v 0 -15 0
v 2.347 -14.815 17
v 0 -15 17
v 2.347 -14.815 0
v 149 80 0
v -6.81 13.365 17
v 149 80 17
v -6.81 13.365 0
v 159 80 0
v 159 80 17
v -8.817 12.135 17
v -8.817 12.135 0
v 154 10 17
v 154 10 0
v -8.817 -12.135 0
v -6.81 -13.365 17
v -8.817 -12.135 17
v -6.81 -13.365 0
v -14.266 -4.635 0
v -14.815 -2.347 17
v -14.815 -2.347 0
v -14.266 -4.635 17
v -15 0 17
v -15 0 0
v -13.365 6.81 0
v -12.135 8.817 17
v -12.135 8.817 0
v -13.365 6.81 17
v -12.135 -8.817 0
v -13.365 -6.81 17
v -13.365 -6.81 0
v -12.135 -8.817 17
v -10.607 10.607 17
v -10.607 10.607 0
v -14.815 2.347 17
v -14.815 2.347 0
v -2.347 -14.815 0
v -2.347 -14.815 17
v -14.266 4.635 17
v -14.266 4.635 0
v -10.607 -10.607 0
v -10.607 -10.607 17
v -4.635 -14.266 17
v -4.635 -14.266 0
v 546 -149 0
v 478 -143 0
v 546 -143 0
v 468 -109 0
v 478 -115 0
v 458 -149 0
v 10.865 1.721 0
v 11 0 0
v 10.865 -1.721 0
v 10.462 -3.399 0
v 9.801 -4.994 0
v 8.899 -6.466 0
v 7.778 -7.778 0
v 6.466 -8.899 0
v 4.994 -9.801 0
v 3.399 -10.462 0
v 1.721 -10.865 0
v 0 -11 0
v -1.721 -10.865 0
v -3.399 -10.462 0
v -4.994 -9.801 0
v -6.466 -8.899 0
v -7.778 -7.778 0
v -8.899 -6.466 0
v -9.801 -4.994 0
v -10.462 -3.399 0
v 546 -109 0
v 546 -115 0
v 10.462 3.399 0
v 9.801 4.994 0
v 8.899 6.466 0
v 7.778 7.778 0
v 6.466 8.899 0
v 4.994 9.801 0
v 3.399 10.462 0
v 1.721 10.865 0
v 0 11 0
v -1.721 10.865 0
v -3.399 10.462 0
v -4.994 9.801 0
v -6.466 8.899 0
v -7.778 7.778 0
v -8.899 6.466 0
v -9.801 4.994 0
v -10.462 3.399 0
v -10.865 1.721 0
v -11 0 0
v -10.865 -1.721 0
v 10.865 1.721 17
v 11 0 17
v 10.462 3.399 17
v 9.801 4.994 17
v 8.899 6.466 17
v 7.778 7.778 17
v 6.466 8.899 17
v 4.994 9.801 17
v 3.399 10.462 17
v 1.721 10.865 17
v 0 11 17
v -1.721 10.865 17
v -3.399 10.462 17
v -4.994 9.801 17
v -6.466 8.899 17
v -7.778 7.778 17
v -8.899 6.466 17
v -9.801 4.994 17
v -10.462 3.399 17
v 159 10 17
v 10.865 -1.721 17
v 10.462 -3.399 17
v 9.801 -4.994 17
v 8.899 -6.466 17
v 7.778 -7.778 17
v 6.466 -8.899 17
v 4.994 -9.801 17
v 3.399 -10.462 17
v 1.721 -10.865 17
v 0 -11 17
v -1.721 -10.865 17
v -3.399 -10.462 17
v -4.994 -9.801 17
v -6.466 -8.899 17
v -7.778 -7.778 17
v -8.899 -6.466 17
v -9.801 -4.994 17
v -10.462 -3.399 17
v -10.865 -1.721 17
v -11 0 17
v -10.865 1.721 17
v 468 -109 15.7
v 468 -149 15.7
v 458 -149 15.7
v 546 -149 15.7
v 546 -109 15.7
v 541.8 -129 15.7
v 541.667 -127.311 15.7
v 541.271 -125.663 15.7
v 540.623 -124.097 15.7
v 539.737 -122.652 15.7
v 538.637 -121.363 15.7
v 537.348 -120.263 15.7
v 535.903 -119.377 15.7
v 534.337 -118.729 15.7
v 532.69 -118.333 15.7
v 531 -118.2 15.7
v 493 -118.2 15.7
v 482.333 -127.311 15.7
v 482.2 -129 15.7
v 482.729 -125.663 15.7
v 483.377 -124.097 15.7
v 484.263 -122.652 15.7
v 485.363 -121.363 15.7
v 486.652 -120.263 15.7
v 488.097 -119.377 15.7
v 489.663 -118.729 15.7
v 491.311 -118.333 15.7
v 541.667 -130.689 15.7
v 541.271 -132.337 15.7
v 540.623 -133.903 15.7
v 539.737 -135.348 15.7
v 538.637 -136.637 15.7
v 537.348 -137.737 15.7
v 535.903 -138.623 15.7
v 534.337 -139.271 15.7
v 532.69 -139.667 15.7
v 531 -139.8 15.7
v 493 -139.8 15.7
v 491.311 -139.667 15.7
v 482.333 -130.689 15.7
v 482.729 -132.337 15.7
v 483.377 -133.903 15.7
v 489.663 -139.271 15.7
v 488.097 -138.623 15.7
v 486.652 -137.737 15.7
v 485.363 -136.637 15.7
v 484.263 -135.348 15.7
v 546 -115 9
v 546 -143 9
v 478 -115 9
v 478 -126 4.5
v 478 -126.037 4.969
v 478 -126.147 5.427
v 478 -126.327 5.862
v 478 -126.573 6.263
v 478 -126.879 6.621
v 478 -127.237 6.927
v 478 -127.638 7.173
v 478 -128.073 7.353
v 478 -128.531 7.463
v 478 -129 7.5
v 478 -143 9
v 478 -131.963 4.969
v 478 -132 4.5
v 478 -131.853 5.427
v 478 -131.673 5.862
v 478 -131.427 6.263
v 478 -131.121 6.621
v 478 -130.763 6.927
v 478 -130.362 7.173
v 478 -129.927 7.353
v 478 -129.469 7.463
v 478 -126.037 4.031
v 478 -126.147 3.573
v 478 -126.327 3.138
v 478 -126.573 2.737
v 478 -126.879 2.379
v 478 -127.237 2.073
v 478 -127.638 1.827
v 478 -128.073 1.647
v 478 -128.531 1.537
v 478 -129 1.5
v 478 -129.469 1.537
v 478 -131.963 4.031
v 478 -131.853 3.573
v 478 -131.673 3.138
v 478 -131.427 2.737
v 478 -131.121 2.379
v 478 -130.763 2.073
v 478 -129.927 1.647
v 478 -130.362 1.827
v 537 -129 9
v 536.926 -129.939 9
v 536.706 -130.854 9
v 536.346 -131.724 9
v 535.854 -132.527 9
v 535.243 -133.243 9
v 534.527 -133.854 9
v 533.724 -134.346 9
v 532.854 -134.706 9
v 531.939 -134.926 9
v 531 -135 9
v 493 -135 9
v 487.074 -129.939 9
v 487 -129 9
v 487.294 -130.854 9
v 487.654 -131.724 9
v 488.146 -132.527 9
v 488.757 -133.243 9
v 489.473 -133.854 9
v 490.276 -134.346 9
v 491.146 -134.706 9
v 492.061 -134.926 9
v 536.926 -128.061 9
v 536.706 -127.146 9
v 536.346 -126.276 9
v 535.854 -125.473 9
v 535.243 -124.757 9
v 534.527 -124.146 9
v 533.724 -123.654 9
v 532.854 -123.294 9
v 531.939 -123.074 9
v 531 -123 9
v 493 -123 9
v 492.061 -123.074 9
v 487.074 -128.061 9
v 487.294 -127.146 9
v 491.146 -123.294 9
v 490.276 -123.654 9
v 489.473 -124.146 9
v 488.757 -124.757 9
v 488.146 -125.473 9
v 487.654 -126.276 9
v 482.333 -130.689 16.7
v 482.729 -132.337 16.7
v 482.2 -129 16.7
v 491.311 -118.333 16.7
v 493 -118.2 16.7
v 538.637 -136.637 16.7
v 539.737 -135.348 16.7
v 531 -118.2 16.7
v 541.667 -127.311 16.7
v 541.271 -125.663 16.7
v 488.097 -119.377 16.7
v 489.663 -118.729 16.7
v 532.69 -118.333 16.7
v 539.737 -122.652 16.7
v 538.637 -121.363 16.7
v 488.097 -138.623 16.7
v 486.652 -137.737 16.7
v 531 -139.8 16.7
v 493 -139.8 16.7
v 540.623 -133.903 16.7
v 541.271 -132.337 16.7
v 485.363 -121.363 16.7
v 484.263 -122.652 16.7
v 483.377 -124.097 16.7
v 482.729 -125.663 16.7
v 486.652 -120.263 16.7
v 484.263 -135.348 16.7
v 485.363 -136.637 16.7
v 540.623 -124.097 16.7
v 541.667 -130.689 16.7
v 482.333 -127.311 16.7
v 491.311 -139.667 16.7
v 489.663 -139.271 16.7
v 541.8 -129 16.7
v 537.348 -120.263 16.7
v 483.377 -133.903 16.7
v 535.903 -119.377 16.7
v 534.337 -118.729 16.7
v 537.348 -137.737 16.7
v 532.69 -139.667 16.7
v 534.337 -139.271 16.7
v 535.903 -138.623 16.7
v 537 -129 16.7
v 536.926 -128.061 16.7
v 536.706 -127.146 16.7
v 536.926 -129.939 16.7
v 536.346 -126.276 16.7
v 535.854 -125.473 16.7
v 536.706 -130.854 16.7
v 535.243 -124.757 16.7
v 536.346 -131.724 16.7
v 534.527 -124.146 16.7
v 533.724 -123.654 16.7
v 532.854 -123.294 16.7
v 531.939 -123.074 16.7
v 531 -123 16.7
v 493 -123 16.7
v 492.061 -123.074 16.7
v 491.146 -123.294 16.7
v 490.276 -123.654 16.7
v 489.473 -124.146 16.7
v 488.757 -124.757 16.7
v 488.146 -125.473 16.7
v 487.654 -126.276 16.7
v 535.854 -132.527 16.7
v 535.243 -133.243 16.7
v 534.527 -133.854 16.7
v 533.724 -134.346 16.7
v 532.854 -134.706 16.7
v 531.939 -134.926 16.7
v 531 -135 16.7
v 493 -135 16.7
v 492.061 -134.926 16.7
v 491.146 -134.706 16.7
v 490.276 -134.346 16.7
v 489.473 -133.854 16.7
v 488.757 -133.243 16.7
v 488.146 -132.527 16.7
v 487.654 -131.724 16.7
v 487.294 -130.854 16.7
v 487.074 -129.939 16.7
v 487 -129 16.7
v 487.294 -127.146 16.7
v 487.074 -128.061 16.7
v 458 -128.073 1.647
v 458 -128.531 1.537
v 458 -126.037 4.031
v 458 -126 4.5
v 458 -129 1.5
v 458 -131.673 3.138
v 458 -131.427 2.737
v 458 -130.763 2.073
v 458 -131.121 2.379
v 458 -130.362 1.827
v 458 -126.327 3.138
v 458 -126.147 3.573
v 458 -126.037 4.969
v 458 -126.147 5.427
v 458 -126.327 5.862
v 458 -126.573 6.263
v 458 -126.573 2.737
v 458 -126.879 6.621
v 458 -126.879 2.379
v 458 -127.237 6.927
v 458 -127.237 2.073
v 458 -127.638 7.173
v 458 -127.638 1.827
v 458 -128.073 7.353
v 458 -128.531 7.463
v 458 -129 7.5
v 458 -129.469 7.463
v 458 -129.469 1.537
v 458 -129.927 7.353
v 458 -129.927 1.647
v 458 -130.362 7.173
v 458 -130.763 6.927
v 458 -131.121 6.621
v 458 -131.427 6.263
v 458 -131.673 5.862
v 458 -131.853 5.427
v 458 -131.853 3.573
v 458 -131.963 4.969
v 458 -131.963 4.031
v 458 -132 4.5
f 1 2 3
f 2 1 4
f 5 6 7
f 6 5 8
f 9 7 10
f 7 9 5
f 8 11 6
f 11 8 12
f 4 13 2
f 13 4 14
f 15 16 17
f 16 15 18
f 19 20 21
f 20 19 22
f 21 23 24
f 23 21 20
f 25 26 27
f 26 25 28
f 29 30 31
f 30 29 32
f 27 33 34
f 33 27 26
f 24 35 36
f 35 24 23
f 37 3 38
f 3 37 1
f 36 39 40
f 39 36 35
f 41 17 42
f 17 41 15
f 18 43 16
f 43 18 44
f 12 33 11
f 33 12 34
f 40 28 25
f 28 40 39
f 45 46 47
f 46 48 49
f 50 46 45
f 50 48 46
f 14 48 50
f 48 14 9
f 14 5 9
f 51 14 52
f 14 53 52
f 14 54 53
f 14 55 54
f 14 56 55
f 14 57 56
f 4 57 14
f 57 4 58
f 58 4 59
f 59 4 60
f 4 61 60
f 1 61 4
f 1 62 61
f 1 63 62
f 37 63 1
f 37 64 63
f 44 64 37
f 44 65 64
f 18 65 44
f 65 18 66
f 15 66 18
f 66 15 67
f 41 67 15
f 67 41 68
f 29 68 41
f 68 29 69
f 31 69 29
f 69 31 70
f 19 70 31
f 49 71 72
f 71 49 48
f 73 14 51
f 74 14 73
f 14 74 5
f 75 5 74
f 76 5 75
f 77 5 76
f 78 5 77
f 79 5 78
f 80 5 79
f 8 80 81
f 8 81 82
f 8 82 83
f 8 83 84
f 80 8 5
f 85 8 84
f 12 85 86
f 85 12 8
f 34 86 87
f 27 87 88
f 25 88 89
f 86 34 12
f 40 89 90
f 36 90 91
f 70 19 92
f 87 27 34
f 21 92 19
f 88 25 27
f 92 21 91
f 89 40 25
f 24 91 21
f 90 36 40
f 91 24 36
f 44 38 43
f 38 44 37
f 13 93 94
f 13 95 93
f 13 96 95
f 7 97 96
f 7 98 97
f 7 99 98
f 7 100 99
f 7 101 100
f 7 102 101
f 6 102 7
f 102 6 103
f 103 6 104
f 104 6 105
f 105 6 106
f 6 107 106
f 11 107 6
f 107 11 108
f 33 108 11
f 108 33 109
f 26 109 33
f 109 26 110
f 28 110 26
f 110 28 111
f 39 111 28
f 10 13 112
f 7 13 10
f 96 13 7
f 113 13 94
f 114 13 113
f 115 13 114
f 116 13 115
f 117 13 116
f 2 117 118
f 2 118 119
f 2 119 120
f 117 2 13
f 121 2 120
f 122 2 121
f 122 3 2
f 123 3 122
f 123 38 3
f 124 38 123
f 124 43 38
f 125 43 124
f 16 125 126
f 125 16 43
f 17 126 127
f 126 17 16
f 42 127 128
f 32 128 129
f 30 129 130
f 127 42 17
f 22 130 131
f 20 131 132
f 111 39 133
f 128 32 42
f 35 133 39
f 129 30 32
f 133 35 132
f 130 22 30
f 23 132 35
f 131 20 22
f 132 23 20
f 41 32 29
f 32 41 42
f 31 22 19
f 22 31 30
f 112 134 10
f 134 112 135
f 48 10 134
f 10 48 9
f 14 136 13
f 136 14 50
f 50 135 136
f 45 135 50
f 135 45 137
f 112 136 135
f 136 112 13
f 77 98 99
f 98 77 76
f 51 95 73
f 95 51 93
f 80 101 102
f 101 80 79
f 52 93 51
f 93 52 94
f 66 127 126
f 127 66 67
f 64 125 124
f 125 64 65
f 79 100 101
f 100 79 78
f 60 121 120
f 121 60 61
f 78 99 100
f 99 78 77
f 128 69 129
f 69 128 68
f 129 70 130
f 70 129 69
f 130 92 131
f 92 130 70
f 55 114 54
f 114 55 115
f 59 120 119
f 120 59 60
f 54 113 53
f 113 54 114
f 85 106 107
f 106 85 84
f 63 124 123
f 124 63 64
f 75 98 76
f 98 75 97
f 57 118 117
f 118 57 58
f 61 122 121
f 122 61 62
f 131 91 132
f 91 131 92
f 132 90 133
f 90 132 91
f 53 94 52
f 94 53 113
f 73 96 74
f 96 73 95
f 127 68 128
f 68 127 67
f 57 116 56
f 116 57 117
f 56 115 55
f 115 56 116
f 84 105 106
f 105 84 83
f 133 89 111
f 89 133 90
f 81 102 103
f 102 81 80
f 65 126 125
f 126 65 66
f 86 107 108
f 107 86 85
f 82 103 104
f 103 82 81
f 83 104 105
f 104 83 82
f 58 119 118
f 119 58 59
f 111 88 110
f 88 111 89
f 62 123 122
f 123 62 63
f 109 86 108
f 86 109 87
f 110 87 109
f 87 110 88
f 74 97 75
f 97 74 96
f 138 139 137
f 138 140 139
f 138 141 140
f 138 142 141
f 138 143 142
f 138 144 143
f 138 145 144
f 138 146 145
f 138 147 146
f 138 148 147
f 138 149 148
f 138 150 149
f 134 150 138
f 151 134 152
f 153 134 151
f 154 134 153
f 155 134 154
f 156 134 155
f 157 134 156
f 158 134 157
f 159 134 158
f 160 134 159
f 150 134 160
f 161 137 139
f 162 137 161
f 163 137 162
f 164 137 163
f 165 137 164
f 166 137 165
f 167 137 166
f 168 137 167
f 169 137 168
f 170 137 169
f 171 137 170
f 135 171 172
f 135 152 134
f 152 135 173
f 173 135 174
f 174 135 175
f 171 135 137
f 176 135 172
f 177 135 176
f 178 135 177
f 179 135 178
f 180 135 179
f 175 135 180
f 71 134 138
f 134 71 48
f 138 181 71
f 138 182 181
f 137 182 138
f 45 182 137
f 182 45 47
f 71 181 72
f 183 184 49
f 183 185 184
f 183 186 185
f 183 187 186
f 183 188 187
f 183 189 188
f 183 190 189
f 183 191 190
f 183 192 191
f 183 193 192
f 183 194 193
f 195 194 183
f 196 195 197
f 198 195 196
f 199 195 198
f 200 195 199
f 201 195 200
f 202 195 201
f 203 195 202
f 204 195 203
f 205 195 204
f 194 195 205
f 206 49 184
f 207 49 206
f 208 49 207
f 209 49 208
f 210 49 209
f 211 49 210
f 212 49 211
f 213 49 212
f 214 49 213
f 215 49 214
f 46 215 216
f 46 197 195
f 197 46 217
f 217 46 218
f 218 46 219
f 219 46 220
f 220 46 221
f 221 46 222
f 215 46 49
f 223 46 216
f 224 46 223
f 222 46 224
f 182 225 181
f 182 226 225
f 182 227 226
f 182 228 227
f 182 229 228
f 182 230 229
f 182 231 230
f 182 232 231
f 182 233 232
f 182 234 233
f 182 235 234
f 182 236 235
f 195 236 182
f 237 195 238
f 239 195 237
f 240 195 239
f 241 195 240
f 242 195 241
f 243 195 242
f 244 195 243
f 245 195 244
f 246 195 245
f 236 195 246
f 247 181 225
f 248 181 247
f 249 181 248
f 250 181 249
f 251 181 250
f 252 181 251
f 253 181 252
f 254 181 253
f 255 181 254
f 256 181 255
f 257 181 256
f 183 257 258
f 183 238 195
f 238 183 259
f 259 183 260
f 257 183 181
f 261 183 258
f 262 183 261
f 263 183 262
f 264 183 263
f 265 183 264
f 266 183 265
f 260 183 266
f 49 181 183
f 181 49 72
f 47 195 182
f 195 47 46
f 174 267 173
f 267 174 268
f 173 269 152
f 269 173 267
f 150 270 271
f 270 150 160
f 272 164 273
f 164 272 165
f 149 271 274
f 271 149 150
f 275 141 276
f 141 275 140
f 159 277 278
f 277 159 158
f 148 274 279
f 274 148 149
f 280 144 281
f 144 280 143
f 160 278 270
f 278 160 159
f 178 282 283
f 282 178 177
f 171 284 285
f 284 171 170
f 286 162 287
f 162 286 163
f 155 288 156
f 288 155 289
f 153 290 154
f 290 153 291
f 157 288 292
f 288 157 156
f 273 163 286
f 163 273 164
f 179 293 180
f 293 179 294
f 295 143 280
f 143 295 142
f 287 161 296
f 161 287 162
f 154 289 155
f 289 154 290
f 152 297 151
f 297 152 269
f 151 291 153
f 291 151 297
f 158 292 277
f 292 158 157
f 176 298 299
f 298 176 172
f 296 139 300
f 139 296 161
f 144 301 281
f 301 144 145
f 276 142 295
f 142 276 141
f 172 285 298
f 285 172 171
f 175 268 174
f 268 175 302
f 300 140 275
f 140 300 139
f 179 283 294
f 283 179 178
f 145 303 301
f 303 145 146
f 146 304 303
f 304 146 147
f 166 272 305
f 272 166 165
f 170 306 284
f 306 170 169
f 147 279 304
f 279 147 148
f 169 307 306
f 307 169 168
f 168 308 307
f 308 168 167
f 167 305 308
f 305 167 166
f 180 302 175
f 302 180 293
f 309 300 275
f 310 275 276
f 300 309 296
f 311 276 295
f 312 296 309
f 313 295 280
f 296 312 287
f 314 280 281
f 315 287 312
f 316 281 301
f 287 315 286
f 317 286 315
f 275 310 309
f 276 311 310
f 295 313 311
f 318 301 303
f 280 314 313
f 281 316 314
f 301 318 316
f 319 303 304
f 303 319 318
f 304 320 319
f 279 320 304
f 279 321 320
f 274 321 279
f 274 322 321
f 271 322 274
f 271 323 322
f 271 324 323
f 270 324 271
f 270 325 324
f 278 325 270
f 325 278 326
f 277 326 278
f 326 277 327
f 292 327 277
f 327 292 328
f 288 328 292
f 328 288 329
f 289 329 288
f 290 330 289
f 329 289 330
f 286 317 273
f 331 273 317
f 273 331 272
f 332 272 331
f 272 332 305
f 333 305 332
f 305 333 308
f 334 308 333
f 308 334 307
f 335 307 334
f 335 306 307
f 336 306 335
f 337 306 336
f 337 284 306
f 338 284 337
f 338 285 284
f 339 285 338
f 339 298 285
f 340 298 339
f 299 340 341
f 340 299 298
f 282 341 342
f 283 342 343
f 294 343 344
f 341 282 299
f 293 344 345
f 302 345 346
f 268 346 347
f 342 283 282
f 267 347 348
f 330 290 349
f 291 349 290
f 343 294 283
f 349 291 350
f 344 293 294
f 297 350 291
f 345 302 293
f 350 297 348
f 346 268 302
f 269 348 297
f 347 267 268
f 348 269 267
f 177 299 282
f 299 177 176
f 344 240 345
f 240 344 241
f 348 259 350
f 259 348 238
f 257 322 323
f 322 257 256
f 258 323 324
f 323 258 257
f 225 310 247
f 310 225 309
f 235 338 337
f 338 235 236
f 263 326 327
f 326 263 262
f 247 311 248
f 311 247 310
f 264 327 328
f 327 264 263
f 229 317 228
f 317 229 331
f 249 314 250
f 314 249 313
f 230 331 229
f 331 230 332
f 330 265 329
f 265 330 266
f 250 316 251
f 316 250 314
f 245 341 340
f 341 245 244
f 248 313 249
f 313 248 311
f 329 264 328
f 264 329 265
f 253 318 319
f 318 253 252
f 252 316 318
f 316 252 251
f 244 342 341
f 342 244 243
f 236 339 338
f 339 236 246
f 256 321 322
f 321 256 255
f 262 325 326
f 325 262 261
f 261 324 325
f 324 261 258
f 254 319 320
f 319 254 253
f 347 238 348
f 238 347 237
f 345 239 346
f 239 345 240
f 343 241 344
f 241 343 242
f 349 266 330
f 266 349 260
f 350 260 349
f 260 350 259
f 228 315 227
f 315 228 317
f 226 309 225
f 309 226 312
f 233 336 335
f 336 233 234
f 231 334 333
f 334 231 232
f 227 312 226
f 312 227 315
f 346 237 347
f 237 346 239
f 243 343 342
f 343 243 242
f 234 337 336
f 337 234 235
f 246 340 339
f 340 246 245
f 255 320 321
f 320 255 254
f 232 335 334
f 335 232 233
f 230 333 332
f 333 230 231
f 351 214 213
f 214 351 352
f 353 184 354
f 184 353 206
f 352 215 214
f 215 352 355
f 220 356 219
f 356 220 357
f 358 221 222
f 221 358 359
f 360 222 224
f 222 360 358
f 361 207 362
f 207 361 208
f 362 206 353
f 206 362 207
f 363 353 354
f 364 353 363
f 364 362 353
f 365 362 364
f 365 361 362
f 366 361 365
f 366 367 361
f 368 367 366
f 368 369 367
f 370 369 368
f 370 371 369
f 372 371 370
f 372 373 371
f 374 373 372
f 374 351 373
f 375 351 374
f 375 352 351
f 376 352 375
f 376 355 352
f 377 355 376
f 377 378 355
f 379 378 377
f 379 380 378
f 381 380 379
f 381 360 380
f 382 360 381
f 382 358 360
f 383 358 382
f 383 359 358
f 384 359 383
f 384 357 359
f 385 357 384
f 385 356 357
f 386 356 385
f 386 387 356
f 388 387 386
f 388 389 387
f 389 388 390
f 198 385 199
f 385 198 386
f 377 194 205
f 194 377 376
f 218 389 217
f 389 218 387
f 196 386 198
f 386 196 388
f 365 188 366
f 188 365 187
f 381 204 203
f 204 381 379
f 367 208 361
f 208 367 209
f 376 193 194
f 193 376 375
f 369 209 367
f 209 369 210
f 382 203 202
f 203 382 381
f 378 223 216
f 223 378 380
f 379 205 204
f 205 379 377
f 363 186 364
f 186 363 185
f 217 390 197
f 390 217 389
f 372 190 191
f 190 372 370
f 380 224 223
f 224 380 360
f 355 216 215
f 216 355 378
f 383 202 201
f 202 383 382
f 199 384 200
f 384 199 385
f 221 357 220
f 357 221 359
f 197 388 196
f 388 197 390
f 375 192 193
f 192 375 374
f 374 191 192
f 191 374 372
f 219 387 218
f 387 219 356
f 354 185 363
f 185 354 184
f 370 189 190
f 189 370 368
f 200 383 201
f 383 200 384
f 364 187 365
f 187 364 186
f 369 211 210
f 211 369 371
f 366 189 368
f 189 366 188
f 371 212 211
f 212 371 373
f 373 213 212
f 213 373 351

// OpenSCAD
// file: util/cylinder_channel.scad
module cylinder_channel(depth, diameter, length, x=0, y=0, z=0) {

    // Translate extruded shape on Z axis
    translate([0, 0, z]) {
        // Cutout
        linear_extrude(depth) {
            // Draw a hull around the two ends of the channel
            // to bore out the channel itself
            hull() {
                // Channel start - 'front'
                translate([x, y]) {
                    circle(d=diameter);
                }

                // Channel end - 'rear'
                translate([x + length, y]) {
                    circle(d=diameter);
                }
            }
        }
    }
}
// file: components/adjuster.scad
def_adj_bolt_diameter     = 6;  // M6x35 Adjuster Bolt
def_adj_bolt_length       = 35;

module SurRonAdjusterHole(
    length=def_adj_bolt_length,
    diameter=def_adj_bolt_diameter,
    height_offset,
    depth_offset,
    length_offset
) {
    // Adjuster bolt hole
    translate([length_offset, -height_offset, depth_offset]) {
    rotate([0, 90, 0]) {
        linear_extrude(length) {
                circle(d=diameter);
            }
        }
    }
}
// file: components/arm.scad
// Sur-Ron Rear Swingarm Arm (one side).
// Default dimensions measured from 2019 LBX (Off-Road) / drawings

def_pivot_diameter       = 22; // Bearing goes in here
def_pivot_outer_diameter = 30; // Guess, needs confirming for clearance
def_pivot_depth          = 17; // Measurement

// Guess, needs measuring later. This is the height between
// the midpoint of the pivot and the top of the midpoint 
// of the swingarm.
def_mid_offset_y         = 80;
def_mid_offset_x         = 149; // Guess, based on technical drawings
def_mid_height           = 70; // Guess
def_mid_depth            = 17; // Measurement, change based on req.
def_mid_length           = 10; // Guess, 1cm flat at 'midpoint'

def_rear_depth           = 15.7; // Must match dropout depth
def_rear_height          = 40; // Must match dropout height
def_rear_length          = 10;


// From technical drawings, this is the horizontal distance
// between the centre of the pivot point and the centre of
// the rear axle. We will need to adjust this based on the
// length of the dropout but for initial purposes, this will
// suffice.
def_length             = 458;

// From technical drawings, this is the drop between
// the center of the front pivot point and the rear axle.
// Since the rear axle is centered in the dropout, for 
// our purposes this is the drop between the centre 
// of the pivot point and the middle of the rear 'height'. 
def_drop               = 129; 


module SurRonArm(
    pivot_diameter=def_pivot_diameter,
    pivot_outer_diameter=def_pivot_outer_diameter,
    pivot_depth=def_pivot_depth,
    mid_height=def_mid_height,
    mid_offset_x=def_mid_offset_x,
    mid_offset_y=def_mid_offset_y,
    mid_depth=def_mid_depth,
    mid_length=def_mid_length,
    rear_depth=def_rear_depth,
    rear_height=def_rear_height,
    rear_length=def_rear_length,
    length=def_length,
    drop=def_drop,
){
    // Offset calculations
    mid_height_offset = mid_offset_y - mid_height;
    mid_rear_offset = mid_offset_x + (mid_length/2);

    rear_drop = - (drop+(rear_height/2));

    dropout_offset = length + rear_length;
    
    // End offset calculations

    difference() {
        union() {
            difference() {
                union() {
                    hull() {
                        // Pivot end swingarm outer
                        linear_extrude(pivot_depth) {
                            circle(d=pivot_outer_diameter);
                        }

                        // Midpoint - front
                        linear_extrude(mid_depth) {
                            translate([mid_offset_x, mid_height_offset]) {
                                square([mid_length/2, mid_height]);
                            }
                        }
                    }

                    hull() {
                        // Midpoint - rear
                        linear_extrude(mid_depth) {
                            translate([mid_rear_offset, mid_height_offset]) {
                                square([mid_length/2, mid_height]);
                            }
                        }

                        // Rear
                        linear_extrude(rear_depth) {
                            translate([length, rear_drop]) {
                                square([rear_length, rear_height]);
                            }
                        }
                    }
                }

                // Pivot end bearing hole
                linear_extrude(pivot_depth) {
                    circle(d=pivot_diameter);
                }
            }

            translate([dropout_offset, rear_drop]) {
                children(index=0);
            }
        }
        children(index=1);
    }
}
// file: components/dropout.scad
include <../util/cylinder_channel.scad>
// Sur-Ron Rear Axle Dropout for Swingarm.
// Default dimensions measured from 2019 LBX (Off-Road)
def_dropout_depth         = 15.7;
def_dropout_height        = 40;
def_dropout_length        = 78;

def_axle_channel_length   = 38;
def_axle_channel_diameter = 12; // M12 Rear Axle

def_adj_channel_depth     = 9;
def_adj_channel_length    = 68;
def_adj_channel_height    = 28;

def_adj_bolt_diameter     = 6;  // M6x35 Adjuster Bolt
def_adj_bolt_length       = 35;

def_pad_depth             = 1;
def_pad_diameter          = def_axle_channel_diameter * 1.8;


module SurRonDropOut(
    depth=def_dropout_depth,
    height=def_dropout_height,
    length=def_dropout_length,
    channel_length=def_axle_channel_length,
    channel_diameter=def_axle_channel_diameter,
    adj_depth=def_adj_channel_depth,
    adj_length=def_adj_channel_length,
    adj_height=def_adj_channel_height,
    adj_bolt_diameter=def_adj_bolt_diameter,
    adj_bolt_length=def_adj_bolt_length,
    pad_depth=def_pad_depth,
    pad_diameter=def_pad_diameter
){
    // Offset calculations

    // Minkowski radius rounds the dropout corners
    // Adding rounded corners needs some other offsets adjusted.
    mink_radius = 0;

    // Center adjuster channel in the dropout based on lengths
    adj_channel_length_offset  = (length - adj_length) + mink_radius;
    adj_channel_height_offset  = (height - adj_height) / 2;

    // Center axle channel in the adjuster channel based on lengths
    axle_channel_length_offset = adj_channel_length_offset + (adj_length - channel_length) / 2;
    axle_channel_height_offset = height / 2; // Distance to center of channel circles

    // Center adj bolt in adjuster channel
    adj_bolt_depth_offset = adj_depth / 2;

    // End offset calculations

    difference() {
        // Add internal pad to dropout
        union() {
            // Pad
            cylinder_channel(
                pad_depth,
                pad_diameter,
                channel_length,
                x=axle_channel_length_offset,
                y=axle_channel_height_offset,
                z=depth
            );

            // Dropout
            // Build out dropout from a base 'block' of material which we subtract from
            difference() {
                // Base dropout material which we subtract from with difference()
                linear_extrude(depth) {
                    //minkowski() {
                        square([length, height]);
                      //  circle(r=mink_radius);
                    //}
                }

                // Adjuster cutout
                linear_extrude(adj_depth) {
                    translate([adj_channel_length_offset, adj_channel_height_offset, 0]) {
                        square([adj_length + mink_radius, adj_height]);
                    }
                }

            }
        }

        // Axle cutout
        cylinder_channel(
            depth + pad_depth,
            channel_diameter,
            channel_length,
            x=axle_channel_length_offset,
            y=axle_channel_height_offset,
            z=0
        );
    }
}
// main file
include <components/dropout.scad>
include <components/arm.scad>
include <components/adjuster.scad>

$fn=40;

adj_channel_depth = 9;
dropout_height    = 40;
drop              = 129;

SurRonArm(rear_height=dropout_height) {
    SurRonDropOut(height=dropout_height);
    SurRonAdjusterHole(
        height_offset=drop, 
        depth_offset=adj_channel_depth/2,
        length_offset=458 
    );
};
